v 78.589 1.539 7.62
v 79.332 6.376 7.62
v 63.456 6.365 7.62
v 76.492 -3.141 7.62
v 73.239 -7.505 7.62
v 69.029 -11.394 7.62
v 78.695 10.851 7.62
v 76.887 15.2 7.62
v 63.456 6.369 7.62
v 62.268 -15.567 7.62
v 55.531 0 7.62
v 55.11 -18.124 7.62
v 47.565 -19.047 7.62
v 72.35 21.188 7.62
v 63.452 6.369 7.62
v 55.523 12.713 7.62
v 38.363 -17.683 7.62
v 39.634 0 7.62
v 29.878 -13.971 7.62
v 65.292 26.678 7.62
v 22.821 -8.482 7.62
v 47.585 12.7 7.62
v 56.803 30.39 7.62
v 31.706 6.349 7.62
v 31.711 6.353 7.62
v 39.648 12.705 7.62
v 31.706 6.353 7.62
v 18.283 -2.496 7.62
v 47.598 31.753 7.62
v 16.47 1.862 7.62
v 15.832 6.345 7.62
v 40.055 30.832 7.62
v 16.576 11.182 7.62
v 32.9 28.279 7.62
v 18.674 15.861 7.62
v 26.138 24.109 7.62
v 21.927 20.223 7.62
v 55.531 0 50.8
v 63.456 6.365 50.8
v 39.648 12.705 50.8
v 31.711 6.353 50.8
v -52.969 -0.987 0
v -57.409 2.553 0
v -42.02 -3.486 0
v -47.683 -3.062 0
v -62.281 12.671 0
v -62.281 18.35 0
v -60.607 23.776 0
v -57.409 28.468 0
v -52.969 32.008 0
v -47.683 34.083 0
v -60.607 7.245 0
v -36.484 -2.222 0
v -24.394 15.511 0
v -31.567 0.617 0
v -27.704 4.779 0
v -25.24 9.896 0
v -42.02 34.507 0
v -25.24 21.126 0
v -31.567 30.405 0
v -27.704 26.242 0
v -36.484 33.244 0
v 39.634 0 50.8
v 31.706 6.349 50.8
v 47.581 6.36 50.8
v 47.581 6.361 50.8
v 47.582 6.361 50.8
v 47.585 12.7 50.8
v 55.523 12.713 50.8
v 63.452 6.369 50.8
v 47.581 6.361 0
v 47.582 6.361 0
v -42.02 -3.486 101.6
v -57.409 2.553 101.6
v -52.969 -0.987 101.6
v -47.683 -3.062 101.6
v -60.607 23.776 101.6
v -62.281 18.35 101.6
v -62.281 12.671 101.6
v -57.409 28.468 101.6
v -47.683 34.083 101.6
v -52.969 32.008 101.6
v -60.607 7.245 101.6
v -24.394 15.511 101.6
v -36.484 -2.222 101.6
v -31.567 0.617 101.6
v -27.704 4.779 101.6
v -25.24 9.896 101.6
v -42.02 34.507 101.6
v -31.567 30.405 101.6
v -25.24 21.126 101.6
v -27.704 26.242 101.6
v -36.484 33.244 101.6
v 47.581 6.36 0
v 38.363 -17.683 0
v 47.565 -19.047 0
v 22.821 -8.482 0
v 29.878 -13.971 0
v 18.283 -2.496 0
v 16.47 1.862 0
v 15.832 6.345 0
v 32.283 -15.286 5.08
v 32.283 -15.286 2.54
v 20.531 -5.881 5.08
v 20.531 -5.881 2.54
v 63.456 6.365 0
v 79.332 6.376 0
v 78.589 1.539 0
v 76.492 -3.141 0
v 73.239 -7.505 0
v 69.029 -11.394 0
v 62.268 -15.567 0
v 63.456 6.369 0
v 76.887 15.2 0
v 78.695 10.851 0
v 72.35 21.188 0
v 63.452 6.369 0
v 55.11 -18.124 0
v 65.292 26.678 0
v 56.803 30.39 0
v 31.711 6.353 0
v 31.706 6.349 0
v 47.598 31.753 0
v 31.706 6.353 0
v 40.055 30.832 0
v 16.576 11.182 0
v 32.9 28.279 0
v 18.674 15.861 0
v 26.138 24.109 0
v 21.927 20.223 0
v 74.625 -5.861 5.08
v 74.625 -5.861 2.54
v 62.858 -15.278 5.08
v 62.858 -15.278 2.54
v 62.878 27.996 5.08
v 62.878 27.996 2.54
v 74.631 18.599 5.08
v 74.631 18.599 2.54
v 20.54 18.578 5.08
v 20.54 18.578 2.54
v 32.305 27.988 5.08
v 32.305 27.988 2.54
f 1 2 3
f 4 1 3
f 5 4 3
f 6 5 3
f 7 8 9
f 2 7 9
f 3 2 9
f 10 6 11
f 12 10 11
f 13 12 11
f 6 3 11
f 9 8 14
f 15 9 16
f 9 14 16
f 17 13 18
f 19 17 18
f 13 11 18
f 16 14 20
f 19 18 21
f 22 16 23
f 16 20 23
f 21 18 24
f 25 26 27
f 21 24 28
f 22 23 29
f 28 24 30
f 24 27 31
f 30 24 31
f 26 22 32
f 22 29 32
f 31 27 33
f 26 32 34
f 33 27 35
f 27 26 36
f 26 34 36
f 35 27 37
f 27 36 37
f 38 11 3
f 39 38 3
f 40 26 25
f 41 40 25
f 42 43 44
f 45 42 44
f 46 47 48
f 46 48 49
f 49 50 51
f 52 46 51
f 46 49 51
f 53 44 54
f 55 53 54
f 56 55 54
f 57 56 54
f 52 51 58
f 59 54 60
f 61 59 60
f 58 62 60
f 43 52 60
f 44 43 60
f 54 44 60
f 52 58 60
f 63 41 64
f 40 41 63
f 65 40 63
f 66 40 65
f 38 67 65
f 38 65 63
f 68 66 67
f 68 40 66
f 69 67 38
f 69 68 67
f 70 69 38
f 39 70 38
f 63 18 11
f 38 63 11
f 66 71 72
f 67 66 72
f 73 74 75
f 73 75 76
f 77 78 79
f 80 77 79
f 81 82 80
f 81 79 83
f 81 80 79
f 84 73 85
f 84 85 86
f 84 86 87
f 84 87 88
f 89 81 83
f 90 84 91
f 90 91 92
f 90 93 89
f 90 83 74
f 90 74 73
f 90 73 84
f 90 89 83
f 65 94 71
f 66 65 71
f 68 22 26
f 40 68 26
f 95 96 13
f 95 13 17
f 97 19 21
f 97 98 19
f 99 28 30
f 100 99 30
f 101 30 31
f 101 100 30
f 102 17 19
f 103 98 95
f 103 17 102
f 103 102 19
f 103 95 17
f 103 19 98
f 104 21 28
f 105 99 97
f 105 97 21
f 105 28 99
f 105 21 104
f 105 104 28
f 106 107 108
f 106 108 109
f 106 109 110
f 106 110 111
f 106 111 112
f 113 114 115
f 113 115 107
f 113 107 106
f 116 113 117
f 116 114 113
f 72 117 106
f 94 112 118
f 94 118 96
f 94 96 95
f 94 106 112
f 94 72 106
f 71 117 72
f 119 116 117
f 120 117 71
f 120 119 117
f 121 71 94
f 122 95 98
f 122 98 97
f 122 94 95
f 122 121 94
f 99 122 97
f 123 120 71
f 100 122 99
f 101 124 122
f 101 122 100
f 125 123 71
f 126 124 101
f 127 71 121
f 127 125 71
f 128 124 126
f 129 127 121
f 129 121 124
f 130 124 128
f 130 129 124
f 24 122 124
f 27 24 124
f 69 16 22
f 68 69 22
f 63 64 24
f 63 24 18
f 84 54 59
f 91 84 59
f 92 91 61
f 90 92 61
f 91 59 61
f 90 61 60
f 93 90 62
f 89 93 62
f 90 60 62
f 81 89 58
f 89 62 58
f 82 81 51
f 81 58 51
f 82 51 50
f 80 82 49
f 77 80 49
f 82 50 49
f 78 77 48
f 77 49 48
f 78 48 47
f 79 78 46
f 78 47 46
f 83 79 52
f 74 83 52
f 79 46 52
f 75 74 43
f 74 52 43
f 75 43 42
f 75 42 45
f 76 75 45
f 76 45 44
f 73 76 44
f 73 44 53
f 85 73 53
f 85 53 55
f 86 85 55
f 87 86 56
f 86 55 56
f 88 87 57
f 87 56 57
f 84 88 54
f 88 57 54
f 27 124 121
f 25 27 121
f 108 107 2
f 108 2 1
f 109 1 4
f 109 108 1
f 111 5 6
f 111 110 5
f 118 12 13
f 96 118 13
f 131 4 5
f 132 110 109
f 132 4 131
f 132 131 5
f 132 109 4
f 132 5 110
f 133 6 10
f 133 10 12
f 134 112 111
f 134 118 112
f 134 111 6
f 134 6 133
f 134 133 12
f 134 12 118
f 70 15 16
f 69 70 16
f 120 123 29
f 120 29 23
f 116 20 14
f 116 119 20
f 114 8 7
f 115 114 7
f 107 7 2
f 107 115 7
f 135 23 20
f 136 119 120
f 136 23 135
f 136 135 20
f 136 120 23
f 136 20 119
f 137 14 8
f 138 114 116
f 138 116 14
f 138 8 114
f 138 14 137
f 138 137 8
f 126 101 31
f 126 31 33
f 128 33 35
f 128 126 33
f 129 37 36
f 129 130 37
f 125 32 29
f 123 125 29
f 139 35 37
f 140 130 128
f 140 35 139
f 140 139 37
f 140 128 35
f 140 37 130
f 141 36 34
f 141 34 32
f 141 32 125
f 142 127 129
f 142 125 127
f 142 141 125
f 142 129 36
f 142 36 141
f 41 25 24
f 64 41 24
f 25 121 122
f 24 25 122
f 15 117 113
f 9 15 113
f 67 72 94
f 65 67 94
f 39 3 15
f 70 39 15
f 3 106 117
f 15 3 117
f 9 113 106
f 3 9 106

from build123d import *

# Parameters (mm, degrees)
F0_R     = 19.05
F1_DEPTH = 101.6
F2_DEPTH = 7.62
F3_DEPTH = 50.8


with BuildPart() as f1:
    # F0 (on Top) → F1 (new body)
    with BuildSketch(Plane.XY):
        with Locations((-43.4440262616, 15.5107108876)):
            Circle(F0_R)
    extrude(amount=F1_DEPTH)


with BuildPart() as f2:
    # F0 (on Top) → F2 (new body)
    with BuildSketch(Plane.XY):
        with BuildLine():
            add(Edge.make_bspline(
                [(15.8317610621, 6.3454846482), (15.8346477167, 19.0481979973), (31.7188776126, 31.7507355826), (47.5975433517, 31.7532892549)],
                knots=[0, 0, 0, 0, 0.2500528794, 0.2500528794, 0.2500528794, 0.2500528794], degree=3))
            Line((15.8317610621, 6.3454846482), (31.7146522069, 19.0493869516))
            Line((31.7146522069, 19.0493869516), (47.5975433517, 31.7532892549))
        make_face()
        with BuildLine():
            add(Edge.make_bspline(
                [(47.5975433517, 31.7532892549), (63.4676360014, 31.7558415485), (79.332170501, 19.0721199858), (79.3317610621, 6.3763237987)],
                knots=[0.2500528794, 0.2500528794, 0.2500528794, 0.2500528794, 0.4999707521, 0.4999707521, 0.4999707521, 0.4999707521], degree=3))
            Line((47.5975433517, 31.7532892549), (63.4646522069, 19.0648065268))
            Line((63.4646522069, 19.0648065268), (79.3317610621, 6.3763237987))
        make_face()
        with BuildLine():
            Line((63.4481841962, -6.3351934732), (47.5646073302, -19.0467107451))
            add(Edge.make_bspline(
                [(79.3317610621, 6.3763237987), (79.3313513488, -6.3279834193), (63.4447194269, -19.0443814564), (47.5646073302, -19.0467107451)],
                knots=[0.4999707521, 0.4999707521, 0.4999707521, 0.4999707521, 0.7500561652, 0.7500561652, 0.7500561652, 0.7500561652], degree=3))
            Line((79.3317610621, 6.3763237987), (63.4481841962, -6.3351934732))
        make_face()
        with BuildLine():
            Line((31.6981841962, -6.3506130484), (15.8317610621, 6.3454846482))
            add(Edge.make_bspline(
                [(47.5646073302, -19.0467107451), (31.6934852757, -19.0490387151), (15.8288756664, -6.3516892281), (15.8317610621, 6.3454846482)],
                knots=[0.7500561652, 0.7500561652, 0.7500561652, 0.7500561652, 1, 1, 1, 1], degree=3))
            Line((47.5646073302, -19.0467107451), (31.6981841962, -6.3506130484))
        make_face()
        Polygon((31.70642067, 6.3531942705), (15.8317610621, 6.3454846482), (31.6981841962, -6.3506130484), (31.7064182015, 6.3493869516), align=None)
        Polygon((31.7146522069, 19.0493869516), (15.8317610621, 6.3454846482), (31.70642067, 6.3531942705), align=None)
        Polygon((31.7146522069, 19.0493869516), (31.70642067, 6.3531942705), (31.7111784944, 6.3531965812), (39.6482066345, 12.7051455875), align=None)
        Polygon((47.5893118148, 19.0570965739), (31.7146522069, 19.0493869516), (39.6482066345, 12.7051455875), (47.5851902108, 12.699999669), align=None)
        Polygon((47.5893118148, 19.0570965739), (47.5975433517, 31.7532892549), (31.7146522069, 19.0493869516), align=None)
        Polygon((63.4646522069, 19.0648065268), (47.5975433517, 31.7532892549), (47.5893118148, 19.0570965739), align=None)
        Polygon((63.4646522069, 19.0648065268), (47.5893118148, 19.0570965739), (47.5851902108, 12.699999669), (55.5232066345, 12.7128553751), align=None)
        Polygon((63.45642067, 6.3686138458), (63.4646522069, 19.0648065268), (55.5232066345, 12.7128553751), (63.4516630497, 6.3686115352), align=None)
        Polygon((63.45642067, 6.3686138458), (79.3317610621, 6.3763237987), (63.4646522069, 19.0648065268), align=None)
        Polygon((63.4481841962, -6.3351934732), (79.3317610621, 6.3763237987), (63.45642067, 6.3686138458), (63.4564182015, 6.3648065268), align=None)
        Polygon((55.5310381027, 0), (63.4481841962, -6.3351934732), (63.4564182015, 6.3648065268), align=None)
        Polygon((47.5769562057, 0), (47.572843804, -6.3429034261), (63.4481841962, -6.3351934732), (55.5310381027, 0), (47.5822905516, 0), align=None)
        Polygon((47.572843804, -6.3429034261), (47.5646073302, -19.0467107451), (63.4481841962, -6.3351934732), align=None)
        Polygon((31.6981841962, -6.3506130484), (47.5646073302, -19.0467107451), (47.572843804, -6.3429034261), align=None)
        Polygon((39.6335430006, 0), (31.6981841962, -6.3506130484), (47.572843804, -6.3429034261), (47.5769562057, 0), align=None)
        Polygon((31.7064182015, 6.3493869516), (31.6981841962, -6.3506130484), (39.6335430006, 0), align=None)
    extrude(amount=F2_DEPTH)

    # F0 (on Top) → F3 (join)
    with BuildSketch(Plane.XY):
        Polygon((47.5851902108, 12.699999669), (39.6482066345, 12.7051455875), (47.5810806309, 6.3614483453), align=None)
        Polygon((55.5232066345, 12.7128553751), (47.5851902108, 12.699999669), (47.5810806309, 6.3614483453), (47.5817610621, 6.3609042235), align=None)
        Polygon((63.4516630497, 6.3686115352), (55.5232066345, 12.7128553751), (47.5817610621, 6.3609042235), align=None)
        Polygon((55.5310381027, 0), (63.4564182015, 6.3648065268), (63.4516630497, 6.3686115352), (47.5817610621, 6.3609042235), align=None)
        Polygon((47.5810799247, 6.3603591138), (47.5769562057, 0), (47.5822905516, 0), (55.5310381027, 0), (47.5817610621, 6.3609042235), align=None)
        Polygon((47.5810799247, 6.3603591138), (39.6335430006, 0), (47.5769562057, 0), align=None)
        Polygon((47.5810802779, 6.3609038928), (31.7111784944, 6.3531965812), (31.7064182015, 6.3493869516), (39.6335430006, 0), (47.5810799247, 6.3603591138), align=None)
        Polygon((39.6482066345, 12.7051455875), (31.7111784944, 6.3531965812), (47.5810802779, 6.3609038928), (47.5810806309, 6.3614483453), align=None)
    extrude(amount=F3_DEPTH)


solid = Compound([f1.part, f2.part])
